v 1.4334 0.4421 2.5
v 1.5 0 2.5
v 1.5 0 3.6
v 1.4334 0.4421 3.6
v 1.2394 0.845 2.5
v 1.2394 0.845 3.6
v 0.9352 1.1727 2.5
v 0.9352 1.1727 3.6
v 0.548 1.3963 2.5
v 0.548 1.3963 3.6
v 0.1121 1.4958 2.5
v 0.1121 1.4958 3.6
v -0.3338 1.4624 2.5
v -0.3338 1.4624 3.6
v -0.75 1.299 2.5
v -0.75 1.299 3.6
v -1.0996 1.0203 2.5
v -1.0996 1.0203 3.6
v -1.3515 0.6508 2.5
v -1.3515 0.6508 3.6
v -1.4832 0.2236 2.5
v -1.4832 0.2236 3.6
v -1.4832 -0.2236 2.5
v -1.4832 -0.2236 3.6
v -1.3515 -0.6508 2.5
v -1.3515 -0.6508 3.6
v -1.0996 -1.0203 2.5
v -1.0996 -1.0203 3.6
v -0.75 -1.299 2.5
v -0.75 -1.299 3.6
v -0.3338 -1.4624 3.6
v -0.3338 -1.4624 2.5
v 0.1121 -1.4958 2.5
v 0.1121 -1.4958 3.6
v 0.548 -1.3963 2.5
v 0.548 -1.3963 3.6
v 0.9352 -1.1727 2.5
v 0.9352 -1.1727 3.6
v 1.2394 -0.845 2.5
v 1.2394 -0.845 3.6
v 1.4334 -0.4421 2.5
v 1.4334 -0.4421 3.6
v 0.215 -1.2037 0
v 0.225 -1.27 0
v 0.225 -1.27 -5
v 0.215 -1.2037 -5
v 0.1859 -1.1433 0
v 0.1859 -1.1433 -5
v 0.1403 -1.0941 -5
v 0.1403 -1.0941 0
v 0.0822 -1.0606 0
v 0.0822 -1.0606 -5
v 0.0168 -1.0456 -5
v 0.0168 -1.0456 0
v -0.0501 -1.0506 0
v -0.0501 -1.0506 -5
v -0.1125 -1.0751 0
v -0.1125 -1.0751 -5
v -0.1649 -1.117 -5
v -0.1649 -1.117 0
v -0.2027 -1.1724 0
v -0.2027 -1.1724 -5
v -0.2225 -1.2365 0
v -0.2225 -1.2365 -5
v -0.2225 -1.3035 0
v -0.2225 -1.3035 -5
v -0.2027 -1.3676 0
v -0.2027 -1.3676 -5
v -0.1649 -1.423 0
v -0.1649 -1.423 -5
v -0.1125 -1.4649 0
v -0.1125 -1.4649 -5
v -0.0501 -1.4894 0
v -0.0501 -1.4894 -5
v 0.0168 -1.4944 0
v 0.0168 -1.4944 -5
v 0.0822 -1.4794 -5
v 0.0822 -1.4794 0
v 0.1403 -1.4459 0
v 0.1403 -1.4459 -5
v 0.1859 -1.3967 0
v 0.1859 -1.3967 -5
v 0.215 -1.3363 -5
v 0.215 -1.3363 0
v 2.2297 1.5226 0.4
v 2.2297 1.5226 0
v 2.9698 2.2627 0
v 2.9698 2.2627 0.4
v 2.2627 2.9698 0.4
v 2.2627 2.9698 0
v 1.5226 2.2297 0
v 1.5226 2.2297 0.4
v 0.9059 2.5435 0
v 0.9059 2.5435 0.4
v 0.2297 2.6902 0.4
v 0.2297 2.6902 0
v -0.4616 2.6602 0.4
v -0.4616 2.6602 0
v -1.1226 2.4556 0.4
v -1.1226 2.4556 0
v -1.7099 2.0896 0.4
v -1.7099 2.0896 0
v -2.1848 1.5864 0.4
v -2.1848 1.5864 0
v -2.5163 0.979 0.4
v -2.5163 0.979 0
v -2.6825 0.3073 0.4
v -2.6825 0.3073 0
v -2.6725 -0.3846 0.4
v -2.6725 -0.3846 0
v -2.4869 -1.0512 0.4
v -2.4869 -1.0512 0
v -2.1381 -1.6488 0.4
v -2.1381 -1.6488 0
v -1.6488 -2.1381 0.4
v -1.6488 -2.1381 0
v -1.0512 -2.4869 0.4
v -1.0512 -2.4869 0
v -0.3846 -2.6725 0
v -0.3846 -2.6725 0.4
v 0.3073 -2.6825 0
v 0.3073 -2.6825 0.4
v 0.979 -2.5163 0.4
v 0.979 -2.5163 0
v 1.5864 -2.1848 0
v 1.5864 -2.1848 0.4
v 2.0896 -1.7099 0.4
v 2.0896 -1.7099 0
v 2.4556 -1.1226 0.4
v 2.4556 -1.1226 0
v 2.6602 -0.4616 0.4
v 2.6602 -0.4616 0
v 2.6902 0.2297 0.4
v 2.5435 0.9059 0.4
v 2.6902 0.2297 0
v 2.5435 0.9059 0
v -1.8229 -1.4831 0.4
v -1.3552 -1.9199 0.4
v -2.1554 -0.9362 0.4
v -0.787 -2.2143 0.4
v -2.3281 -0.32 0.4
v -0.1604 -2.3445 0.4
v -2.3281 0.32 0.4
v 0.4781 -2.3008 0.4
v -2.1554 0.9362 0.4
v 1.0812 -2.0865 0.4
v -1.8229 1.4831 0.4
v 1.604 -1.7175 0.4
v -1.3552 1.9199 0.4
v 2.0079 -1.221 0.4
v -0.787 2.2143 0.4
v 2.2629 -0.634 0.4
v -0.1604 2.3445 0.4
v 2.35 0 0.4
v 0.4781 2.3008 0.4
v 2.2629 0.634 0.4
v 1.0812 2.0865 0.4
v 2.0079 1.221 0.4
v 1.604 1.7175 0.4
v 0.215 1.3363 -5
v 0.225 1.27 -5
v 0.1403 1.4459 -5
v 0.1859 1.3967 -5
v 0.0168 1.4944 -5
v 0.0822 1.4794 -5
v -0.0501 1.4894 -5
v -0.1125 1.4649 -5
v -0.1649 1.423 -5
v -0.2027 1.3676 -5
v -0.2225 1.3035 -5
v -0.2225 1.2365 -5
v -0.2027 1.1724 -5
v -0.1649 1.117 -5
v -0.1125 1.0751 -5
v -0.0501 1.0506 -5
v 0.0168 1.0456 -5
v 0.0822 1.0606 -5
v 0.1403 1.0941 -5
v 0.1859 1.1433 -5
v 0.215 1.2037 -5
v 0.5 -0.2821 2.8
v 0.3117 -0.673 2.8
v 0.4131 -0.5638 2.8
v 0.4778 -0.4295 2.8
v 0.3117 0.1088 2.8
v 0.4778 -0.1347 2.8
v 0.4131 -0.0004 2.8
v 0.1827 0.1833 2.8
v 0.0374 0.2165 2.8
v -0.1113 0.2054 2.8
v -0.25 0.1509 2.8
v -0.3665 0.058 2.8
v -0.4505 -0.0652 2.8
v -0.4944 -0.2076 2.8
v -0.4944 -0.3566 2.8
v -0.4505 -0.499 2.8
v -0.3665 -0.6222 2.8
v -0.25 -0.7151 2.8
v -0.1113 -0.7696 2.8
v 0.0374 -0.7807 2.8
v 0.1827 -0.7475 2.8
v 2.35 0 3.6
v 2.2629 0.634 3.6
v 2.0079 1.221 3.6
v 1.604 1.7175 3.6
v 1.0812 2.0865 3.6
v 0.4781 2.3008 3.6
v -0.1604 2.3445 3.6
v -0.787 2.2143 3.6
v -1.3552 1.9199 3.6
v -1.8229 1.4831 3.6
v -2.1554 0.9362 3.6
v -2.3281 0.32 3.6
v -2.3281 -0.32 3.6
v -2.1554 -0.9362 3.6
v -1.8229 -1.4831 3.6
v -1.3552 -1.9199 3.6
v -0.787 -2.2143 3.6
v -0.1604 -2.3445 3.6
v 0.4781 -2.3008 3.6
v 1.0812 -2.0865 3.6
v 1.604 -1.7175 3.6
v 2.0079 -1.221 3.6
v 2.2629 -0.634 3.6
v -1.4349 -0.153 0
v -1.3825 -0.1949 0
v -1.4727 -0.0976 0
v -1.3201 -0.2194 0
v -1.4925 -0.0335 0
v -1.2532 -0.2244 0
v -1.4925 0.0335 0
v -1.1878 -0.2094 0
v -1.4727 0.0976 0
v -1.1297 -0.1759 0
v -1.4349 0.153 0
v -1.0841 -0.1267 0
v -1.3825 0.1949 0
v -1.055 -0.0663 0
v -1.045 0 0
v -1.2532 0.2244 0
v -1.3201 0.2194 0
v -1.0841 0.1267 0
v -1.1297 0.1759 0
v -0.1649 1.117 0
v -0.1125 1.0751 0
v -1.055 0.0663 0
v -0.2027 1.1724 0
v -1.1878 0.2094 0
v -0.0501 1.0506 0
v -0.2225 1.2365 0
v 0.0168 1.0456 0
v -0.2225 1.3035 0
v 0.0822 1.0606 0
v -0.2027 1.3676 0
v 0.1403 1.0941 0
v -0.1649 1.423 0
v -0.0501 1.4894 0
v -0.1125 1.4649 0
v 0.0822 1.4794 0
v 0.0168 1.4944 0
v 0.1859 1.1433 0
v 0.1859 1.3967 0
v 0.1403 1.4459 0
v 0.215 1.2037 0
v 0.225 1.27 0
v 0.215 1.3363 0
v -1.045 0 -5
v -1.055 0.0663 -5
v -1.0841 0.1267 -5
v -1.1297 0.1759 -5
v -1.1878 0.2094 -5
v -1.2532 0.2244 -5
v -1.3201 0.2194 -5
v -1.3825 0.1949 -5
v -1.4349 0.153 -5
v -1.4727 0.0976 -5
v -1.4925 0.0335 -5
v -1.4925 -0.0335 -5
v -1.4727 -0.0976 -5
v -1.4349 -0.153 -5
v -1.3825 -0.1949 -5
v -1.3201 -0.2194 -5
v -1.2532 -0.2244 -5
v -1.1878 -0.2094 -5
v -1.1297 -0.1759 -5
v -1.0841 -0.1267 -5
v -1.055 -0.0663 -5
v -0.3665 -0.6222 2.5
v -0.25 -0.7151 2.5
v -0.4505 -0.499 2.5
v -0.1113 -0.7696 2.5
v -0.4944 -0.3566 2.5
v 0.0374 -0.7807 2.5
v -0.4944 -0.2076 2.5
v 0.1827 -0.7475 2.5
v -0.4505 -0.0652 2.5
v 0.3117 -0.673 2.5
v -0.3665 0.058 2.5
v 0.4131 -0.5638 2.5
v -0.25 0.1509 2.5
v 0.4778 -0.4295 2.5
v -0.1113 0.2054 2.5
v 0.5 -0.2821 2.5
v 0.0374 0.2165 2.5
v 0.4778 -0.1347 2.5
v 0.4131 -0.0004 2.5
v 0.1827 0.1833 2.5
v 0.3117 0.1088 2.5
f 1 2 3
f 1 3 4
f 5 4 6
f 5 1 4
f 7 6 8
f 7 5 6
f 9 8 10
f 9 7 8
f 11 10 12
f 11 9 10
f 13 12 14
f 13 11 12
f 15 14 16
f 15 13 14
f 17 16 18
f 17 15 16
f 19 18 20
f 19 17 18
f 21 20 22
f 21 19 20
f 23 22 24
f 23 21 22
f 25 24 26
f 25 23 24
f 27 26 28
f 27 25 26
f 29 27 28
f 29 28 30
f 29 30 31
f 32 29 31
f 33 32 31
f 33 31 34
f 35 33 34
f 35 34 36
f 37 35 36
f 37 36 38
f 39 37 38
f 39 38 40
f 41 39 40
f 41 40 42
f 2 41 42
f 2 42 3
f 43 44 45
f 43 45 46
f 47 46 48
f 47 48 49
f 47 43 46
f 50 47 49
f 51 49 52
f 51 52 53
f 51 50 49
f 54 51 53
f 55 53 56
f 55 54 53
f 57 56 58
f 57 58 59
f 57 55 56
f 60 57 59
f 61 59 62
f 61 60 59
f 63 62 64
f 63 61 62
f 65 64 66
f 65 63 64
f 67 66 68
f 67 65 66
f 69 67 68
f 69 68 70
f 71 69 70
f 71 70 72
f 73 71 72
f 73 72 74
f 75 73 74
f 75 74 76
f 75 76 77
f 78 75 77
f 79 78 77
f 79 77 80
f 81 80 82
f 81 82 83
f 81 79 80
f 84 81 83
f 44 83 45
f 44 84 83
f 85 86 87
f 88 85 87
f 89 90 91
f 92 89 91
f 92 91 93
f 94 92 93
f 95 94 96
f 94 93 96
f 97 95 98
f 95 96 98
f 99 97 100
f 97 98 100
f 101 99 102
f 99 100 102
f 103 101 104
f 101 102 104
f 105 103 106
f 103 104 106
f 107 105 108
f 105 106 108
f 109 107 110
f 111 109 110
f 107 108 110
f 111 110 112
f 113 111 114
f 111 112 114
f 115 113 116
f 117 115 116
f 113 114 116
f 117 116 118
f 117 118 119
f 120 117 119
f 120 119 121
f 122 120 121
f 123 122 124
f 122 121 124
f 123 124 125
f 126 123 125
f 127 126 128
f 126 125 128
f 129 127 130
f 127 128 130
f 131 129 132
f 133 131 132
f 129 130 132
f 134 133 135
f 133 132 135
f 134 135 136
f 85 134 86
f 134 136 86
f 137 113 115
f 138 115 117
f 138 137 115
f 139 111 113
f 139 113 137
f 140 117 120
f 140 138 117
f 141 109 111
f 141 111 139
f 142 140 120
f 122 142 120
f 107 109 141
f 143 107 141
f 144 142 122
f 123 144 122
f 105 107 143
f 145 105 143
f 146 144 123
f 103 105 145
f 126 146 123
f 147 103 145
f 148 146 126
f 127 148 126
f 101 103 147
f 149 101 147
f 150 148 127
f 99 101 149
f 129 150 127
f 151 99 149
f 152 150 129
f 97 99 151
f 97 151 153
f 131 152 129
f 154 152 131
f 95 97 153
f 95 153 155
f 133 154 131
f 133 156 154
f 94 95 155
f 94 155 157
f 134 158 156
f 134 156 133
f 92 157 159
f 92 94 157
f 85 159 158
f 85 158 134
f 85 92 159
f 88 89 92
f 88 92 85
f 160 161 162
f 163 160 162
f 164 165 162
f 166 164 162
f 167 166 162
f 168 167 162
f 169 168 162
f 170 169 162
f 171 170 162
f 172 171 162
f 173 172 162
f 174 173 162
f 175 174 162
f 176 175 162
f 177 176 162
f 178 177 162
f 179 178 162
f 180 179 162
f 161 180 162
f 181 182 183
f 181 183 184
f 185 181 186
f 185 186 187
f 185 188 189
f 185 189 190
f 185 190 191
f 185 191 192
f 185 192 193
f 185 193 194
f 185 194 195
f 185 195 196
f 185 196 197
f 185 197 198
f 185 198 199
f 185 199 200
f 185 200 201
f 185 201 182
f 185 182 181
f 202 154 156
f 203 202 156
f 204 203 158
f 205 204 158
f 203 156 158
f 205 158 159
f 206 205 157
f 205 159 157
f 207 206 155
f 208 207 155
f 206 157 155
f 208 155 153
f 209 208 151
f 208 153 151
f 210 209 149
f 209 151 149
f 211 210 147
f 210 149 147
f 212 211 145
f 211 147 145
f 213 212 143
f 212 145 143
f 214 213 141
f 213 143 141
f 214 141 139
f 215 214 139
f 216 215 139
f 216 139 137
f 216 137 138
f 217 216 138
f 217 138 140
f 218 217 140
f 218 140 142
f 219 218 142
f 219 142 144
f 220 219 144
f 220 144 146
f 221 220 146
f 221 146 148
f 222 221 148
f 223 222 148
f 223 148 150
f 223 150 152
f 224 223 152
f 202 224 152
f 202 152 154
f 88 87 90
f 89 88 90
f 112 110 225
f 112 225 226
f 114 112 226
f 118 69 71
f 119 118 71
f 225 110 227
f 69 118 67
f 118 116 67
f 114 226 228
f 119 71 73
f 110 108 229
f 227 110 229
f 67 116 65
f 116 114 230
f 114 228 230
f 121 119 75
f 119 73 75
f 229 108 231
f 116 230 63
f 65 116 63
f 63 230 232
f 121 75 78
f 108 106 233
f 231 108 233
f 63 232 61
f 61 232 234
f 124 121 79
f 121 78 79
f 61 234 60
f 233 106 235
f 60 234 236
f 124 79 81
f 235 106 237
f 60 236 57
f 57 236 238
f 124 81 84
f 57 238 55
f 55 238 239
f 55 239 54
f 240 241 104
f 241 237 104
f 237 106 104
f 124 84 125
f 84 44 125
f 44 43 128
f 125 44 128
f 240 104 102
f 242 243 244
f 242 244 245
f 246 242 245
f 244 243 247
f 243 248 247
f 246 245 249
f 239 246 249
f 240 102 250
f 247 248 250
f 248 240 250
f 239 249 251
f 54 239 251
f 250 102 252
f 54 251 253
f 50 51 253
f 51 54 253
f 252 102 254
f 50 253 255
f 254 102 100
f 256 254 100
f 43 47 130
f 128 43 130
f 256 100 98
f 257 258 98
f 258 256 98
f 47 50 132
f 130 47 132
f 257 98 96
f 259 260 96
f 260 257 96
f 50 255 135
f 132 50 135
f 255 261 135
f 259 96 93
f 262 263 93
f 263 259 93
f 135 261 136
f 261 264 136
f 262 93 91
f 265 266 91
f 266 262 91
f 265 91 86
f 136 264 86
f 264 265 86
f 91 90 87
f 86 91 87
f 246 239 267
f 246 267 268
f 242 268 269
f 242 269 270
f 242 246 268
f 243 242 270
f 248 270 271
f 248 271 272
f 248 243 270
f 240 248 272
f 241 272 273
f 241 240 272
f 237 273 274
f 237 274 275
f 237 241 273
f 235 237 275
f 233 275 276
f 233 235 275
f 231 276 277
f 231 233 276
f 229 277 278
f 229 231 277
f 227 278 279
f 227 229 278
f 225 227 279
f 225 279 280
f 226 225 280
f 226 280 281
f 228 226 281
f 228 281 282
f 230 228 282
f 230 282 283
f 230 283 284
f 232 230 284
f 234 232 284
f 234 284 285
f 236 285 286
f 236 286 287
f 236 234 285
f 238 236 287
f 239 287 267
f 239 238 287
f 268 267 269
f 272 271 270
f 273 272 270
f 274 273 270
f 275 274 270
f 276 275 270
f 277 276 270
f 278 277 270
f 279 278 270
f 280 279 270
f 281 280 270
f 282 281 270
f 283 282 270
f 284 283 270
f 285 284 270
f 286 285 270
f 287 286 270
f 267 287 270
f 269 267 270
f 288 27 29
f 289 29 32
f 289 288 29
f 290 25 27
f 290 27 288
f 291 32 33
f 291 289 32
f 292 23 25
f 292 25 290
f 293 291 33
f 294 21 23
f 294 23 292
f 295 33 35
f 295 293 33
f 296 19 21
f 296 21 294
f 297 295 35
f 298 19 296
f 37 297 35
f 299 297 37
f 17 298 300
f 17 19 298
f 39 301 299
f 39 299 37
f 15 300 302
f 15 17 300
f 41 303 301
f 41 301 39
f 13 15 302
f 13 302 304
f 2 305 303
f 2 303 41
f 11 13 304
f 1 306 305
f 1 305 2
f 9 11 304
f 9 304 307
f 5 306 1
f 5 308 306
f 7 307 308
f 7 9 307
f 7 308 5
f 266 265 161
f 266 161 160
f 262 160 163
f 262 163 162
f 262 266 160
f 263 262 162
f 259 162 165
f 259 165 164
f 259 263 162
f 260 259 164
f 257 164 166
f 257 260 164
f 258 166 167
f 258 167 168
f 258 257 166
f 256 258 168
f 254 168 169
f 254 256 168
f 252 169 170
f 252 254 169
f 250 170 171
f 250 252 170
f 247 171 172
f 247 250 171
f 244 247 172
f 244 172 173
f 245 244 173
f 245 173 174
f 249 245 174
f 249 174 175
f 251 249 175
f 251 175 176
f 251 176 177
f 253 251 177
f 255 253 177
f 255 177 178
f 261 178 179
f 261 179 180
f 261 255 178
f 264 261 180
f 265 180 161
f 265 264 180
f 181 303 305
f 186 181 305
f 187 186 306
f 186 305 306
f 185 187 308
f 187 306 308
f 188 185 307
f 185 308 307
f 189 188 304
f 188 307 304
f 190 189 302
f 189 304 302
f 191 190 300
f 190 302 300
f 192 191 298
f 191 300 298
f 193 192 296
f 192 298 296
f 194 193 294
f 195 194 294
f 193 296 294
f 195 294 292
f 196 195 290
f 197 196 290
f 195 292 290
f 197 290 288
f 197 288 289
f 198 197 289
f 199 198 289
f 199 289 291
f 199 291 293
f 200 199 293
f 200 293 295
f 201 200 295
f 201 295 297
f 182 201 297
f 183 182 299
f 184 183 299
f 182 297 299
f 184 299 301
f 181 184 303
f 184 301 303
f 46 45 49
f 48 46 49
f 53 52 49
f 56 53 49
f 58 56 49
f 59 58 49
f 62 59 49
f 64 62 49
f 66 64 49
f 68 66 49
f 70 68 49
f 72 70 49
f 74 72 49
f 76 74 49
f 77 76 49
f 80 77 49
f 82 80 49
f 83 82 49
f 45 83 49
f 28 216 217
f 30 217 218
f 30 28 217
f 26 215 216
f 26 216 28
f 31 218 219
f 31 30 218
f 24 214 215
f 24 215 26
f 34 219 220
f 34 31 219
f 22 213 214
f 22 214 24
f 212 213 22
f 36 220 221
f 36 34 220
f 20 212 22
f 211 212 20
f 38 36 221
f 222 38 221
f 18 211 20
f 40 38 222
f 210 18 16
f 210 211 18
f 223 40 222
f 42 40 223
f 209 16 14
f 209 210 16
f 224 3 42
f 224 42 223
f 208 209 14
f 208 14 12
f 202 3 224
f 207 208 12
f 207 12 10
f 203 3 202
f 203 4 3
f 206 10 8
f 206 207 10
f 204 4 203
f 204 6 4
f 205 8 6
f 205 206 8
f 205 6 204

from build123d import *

# Parameters (mm, degrees)
F0_R     = 2.35
F0_R_2   = 1.5
F1_DEPTH = 3.6
F2_DEPTH = 0.4
F3_DEPTH = 2.5
F4_R     = 0.5
F5_DEPTH = 0.3
F6_R     = 0.225
F7_DEPTH = 5


with BuildPart() as f1:
    # F0 (on Top) → F1 (new body)
    with BuildSketch(Plane.XY):
        Circle(F0_R)
        Circle(F0_R_2, mode=Mode.SUBTRACT)
    extrude(amount=F1_DEPTH)

    # F0 (on Top) → F2 (join)
    with BuildSketch(Plane.XY):
        with BuildLine():
            Line((2.262742, 2.969848), (1.522613, 2.22972))
            ThreePointArc((1.522613, 2.22972), (-1.909188, -1.909188), (2.22972, 1.522613))
            Line((2.22972, 1.522613), (2.969848, 2.262742))
            Line((2.969848, 2.262742), (2.616295, 2.616295))
            Line((2.616295, 2.616295), (2.262742, 2.969848))
        make_face()
        Circle(F0_R, mode=Mode.SUBTRACT)
    extrude(amount=F2_DEPTH)

    # F0 (on Top) → F3 (join)
    with BuildSketch(Plane.XY):
        Circle(F0_R_2)
    extrude(amount=F3_DEPTH)

    # F4 (on face) → F5 (join)
    with BuildSketch(Plane.XY.offset(2.5)):
        with Locations((0, -0.282093)):
            Circle(F4_R)
    extrude(amount=F5_DEPTH)

    # F6 (on face) → F7 (join)
    with BuildSketch(Plane.XY):
        with Locations((0, -1.27)):
            Circle(F6_R)
        with Locations((-1.27, 0)):
            Circle(F6_R)
        with Locations((0, 1.27)):
            Circle(F6_R)
    extrude(amount=-F7_DEPTH)


solid = f1.part
